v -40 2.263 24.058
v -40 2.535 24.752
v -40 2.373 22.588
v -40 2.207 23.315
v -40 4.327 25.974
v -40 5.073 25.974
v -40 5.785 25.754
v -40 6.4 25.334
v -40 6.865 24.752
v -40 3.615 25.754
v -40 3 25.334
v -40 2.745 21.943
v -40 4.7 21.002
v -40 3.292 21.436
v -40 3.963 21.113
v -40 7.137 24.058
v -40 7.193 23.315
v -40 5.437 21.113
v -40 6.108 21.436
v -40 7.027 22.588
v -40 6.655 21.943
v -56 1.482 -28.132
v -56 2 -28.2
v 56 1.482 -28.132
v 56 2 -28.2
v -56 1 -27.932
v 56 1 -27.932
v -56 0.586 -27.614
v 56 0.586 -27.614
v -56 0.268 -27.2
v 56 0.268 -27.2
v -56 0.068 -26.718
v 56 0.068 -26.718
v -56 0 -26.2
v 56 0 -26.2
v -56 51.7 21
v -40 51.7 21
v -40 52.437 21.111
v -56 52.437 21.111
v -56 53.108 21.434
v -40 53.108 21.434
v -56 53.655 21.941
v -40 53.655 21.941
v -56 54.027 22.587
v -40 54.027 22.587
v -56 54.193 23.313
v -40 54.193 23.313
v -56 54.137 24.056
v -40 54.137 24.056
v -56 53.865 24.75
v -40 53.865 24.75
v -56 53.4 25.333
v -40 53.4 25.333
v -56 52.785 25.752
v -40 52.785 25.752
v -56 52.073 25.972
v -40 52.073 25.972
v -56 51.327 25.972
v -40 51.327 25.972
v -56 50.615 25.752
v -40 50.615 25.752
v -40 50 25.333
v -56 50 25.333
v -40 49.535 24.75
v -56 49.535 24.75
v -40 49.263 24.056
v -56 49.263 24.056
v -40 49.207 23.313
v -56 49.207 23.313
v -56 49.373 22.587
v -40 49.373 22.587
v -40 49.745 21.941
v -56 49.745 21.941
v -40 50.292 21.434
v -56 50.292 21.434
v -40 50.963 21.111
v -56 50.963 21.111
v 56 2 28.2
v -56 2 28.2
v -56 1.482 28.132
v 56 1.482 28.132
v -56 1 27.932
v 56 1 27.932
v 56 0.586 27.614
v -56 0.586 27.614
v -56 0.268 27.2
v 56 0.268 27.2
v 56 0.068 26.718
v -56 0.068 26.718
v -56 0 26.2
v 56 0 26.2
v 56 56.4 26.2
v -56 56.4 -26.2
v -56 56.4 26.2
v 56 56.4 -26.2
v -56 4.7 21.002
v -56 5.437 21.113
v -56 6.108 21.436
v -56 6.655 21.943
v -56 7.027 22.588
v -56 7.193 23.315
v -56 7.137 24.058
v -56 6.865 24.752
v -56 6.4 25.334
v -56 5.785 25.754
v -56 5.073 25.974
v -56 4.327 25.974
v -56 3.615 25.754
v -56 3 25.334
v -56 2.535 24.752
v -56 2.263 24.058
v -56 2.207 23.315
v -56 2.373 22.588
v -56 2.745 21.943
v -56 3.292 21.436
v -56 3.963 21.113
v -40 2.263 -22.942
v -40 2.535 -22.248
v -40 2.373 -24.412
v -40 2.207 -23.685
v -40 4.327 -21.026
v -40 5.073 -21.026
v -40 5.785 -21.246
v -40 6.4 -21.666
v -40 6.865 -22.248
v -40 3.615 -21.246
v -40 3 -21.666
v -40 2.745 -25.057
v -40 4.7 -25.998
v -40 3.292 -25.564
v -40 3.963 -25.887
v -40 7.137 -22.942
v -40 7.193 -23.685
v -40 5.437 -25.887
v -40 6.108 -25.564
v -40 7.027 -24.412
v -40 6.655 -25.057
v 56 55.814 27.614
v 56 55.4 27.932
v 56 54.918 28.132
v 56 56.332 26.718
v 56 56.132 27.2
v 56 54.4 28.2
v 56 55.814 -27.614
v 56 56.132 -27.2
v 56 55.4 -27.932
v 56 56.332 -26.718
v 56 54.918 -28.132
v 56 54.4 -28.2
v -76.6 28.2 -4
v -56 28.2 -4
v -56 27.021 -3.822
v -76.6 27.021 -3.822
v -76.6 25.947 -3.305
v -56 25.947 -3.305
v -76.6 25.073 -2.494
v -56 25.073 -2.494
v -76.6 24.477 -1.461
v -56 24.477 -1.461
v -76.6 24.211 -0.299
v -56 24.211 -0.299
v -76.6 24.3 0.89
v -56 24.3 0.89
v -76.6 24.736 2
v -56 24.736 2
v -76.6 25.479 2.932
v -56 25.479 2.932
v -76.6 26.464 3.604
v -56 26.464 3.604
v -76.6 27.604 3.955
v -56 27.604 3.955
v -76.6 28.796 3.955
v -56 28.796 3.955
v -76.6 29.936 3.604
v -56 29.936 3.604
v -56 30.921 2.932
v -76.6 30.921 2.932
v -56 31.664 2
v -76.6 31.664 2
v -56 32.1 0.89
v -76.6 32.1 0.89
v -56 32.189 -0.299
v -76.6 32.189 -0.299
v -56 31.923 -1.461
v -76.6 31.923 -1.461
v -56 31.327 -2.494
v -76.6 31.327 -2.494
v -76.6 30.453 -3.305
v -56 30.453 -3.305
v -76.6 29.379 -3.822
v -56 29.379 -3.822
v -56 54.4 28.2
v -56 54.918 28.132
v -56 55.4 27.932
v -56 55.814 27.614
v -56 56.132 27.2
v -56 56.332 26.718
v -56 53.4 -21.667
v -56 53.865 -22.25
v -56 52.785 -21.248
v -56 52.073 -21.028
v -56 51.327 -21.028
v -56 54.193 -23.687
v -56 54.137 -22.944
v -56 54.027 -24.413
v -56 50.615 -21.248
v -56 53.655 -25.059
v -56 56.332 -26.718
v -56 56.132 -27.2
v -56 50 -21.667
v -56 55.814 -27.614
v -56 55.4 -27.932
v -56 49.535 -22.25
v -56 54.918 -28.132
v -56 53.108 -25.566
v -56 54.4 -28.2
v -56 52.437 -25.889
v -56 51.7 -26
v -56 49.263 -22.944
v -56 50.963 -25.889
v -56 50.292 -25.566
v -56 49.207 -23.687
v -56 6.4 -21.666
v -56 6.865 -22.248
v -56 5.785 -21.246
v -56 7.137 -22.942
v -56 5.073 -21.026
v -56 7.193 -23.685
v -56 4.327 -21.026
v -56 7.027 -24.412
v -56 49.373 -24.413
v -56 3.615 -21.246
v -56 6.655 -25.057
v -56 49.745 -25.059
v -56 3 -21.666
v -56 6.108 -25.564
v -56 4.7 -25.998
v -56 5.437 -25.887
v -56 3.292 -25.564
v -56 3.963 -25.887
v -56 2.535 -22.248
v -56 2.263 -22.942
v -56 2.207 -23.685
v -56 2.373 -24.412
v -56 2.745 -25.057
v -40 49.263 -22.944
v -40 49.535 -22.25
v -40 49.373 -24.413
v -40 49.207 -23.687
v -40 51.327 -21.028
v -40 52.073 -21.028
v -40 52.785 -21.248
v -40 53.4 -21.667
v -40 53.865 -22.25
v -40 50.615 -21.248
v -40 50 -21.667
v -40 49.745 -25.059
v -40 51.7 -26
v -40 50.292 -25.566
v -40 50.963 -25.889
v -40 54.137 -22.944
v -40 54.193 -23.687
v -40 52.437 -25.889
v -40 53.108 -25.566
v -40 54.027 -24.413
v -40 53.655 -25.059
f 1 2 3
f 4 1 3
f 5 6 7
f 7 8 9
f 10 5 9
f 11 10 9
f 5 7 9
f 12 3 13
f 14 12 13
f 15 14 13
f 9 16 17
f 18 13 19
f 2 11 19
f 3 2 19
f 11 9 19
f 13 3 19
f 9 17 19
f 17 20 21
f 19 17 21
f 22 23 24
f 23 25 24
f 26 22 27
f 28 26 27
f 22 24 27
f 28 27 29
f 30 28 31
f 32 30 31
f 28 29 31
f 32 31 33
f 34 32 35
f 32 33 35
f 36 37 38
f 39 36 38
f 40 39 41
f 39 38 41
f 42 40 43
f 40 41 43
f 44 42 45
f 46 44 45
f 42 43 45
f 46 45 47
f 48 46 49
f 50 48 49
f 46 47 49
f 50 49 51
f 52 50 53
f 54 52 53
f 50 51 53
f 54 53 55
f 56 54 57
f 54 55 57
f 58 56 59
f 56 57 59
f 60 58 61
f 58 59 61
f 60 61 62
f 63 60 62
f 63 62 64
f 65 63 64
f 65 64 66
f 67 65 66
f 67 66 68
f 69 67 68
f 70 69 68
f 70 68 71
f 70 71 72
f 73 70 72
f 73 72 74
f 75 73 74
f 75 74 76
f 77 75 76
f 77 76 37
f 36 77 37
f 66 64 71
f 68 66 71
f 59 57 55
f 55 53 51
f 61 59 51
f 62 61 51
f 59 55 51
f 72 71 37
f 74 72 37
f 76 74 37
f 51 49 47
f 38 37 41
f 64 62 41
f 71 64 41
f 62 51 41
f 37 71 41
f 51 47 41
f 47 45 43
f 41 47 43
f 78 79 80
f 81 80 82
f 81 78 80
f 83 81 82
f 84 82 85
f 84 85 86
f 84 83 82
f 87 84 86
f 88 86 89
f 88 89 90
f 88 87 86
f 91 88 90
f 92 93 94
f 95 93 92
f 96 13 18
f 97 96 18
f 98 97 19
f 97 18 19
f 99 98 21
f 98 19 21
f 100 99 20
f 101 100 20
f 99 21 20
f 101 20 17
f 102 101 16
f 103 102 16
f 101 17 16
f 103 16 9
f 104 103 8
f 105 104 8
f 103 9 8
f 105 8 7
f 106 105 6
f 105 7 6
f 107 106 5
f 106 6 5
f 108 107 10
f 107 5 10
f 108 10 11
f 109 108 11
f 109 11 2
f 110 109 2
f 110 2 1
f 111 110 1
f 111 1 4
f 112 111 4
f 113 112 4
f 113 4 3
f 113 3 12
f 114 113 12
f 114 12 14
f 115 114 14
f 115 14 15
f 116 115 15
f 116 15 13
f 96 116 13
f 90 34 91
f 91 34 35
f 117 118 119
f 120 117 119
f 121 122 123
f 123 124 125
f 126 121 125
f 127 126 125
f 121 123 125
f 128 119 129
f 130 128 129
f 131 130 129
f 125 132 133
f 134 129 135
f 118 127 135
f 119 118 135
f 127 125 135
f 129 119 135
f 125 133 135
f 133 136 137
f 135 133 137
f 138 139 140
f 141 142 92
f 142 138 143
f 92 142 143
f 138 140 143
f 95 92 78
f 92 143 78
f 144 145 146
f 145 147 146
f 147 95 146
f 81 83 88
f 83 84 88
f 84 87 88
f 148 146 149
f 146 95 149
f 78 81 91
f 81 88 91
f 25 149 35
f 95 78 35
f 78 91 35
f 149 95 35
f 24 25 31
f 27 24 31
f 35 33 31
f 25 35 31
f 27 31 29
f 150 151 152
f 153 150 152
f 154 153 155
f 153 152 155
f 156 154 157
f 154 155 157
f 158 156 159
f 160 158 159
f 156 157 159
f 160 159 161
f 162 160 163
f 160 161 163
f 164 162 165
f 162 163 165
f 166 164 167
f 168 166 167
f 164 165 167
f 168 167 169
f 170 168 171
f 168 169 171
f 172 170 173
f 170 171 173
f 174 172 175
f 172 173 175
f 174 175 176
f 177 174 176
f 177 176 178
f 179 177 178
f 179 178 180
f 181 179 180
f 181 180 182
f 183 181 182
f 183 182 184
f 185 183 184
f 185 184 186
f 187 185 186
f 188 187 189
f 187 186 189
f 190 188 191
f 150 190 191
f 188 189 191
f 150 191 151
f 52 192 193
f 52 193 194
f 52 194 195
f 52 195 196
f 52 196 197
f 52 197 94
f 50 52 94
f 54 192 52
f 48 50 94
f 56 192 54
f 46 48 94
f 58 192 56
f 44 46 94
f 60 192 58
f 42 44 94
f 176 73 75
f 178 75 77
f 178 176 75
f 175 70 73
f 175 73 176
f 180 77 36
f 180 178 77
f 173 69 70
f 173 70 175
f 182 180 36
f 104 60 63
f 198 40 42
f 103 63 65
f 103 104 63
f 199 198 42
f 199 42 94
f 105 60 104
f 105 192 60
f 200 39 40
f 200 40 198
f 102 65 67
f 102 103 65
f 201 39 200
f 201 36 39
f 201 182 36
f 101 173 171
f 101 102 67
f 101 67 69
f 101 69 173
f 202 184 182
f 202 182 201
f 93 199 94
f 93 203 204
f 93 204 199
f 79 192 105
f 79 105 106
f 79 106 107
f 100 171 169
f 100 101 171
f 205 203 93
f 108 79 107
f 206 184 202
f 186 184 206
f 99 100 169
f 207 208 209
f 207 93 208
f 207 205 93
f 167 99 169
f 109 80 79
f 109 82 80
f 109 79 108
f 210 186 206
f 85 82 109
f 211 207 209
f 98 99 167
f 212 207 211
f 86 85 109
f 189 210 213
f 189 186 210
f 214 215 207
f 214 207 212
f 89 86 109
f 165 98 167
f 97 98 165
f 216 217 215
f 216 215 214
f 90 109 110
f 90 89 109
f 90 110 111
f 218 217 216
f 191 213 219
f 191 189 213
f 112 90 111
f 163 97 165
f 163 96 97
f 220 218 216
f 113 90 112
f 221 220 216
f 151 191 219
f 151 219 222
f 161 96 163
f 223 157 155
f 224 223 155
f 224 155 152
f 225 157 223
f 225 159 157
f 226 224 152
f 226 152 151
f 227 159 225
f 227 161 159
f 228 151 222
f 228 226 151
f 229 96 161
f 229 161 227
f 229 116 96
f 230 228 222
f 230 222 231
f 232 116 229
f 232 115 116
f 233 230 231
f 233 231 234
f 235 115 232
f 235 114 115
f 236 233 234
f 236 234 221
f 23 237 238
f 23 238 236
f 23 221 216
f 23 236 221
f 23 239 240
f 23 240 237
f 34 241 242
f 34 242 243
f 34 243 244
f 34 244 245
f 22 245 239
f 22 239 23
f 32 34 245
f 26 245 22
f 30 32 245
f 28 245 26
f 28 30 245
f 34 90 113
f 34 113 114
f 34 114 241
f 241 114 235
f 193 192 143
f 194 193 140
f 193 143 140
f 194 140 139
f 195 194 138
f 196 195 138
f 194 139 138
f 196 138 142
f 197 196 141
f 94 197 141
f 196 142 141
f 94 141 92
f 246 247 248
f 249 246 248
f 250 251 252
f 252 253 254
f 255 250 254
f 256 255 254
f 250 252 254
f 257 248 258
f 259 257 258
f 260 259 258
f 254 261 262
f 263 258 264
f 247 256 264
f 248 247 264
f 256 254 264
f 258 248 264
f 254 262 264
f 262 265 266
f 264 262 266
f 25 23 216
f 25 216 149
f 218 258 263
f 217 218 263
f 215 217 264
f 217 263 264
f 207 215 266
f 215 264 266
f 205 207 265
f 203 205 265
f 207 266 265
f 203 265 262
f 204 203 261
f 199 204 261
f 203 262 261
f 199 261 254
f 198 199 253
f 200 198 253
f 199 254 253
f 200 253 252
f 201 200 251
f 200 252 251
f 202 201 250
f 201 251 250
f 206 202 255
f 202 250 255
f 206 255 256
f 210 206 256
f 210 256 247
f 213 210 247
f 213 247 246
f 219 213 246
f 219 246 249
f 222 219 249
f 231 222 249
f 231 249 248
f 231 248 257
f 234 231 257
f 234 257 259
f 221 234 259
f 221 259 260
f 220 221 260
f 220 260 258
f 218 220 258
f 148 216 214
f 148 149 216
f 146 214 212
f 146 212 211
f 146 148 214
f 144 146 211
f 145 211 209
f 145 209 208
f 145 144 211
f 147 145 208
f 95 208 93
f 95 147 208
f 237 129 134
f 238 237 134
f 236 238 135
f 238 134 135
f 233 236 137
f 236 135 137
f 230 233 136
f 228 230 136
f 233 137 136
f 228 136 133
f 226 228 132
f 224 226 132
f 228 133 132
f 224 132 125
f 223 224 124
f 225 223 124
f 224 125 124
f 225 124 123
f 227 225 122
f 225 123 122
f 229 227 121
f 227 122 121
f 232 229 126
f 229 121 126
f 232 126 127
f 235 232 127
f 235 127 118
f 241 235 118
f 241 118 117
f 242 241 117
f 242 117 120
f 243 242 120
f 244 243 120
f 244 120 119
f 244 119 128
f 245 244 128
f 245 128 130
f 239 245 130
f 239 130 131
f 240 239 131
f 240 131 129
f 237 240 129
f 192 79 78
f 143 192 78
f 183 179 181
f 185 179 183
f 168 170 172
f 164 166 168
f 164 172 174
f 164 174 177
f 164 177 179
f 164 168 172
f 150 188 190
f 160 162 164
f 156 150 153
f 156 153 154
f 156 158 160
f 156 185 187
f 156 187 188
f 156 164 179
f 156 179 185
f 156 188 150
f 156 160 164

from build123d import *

# Parameters (mm, degrees)
SKETCH1_W                    = 112
SKETCH1_H                    = 56.4
BOSS_EXTRUDE1_DEPTH          = 56.4
FILLET1_R                    = 2
SKETCH2_R                    = 4
BOSS_EXTRUDE2_DEPTH          = 20.6
F_5_0_5_DIAMETER_HOLE1_D     = 5
F_5_0_5_DIAMETER_HOLE1_DEPTH = 16


with BuildPart() as part:
    # Sketch1 → Boss-Extrude1 (new body)
    with BuildSketch(Plane(origin=(0, 0, 0), x_dir=(1, 0, 0), z_dir=(0, 1, 0))):
        Rectangle(SKETCH1_W, SKETCH1_H)
    extrude(amount=BOSS_EXTRUDE1_DEPTH)

    # Fillet1
    fillet1_edges = [part.edges().sort_by_distance(p)[0] for p in [
        (0, 56.4, 28.2),
        (0, 56.4, -28.2),
        (0, 0, -28.2),
        (0, 0, 28.2),
    ]]
    fillet(fillet1_edges, radius=FILLET1_R)

    # Sketch2 → Boss-Extrude2 (add)
    with BuildSketch(Plane.ZY.offset(56)):
        with Locations((0, 28.2)):
            Circle(SKETCH2_R)
    extrude(amount=BOSS_EXTRUDE2_DEPTH)

    # Ø5.0 (5) Diameter Hole1
    with Locations(Plane.ZY.offset(56)):
        with Locations((-23.5, 51.7), (23.5, 51.7), (23.501841312, 4.700000036), (-23.498158688, 4.700000036)):
            Hole(F_5_0_5_DIAMETER_HOLE1_D / 2, depth=F_5_0_5_DIAMETER_HOLE1_DEPTH)


solid = part.part
